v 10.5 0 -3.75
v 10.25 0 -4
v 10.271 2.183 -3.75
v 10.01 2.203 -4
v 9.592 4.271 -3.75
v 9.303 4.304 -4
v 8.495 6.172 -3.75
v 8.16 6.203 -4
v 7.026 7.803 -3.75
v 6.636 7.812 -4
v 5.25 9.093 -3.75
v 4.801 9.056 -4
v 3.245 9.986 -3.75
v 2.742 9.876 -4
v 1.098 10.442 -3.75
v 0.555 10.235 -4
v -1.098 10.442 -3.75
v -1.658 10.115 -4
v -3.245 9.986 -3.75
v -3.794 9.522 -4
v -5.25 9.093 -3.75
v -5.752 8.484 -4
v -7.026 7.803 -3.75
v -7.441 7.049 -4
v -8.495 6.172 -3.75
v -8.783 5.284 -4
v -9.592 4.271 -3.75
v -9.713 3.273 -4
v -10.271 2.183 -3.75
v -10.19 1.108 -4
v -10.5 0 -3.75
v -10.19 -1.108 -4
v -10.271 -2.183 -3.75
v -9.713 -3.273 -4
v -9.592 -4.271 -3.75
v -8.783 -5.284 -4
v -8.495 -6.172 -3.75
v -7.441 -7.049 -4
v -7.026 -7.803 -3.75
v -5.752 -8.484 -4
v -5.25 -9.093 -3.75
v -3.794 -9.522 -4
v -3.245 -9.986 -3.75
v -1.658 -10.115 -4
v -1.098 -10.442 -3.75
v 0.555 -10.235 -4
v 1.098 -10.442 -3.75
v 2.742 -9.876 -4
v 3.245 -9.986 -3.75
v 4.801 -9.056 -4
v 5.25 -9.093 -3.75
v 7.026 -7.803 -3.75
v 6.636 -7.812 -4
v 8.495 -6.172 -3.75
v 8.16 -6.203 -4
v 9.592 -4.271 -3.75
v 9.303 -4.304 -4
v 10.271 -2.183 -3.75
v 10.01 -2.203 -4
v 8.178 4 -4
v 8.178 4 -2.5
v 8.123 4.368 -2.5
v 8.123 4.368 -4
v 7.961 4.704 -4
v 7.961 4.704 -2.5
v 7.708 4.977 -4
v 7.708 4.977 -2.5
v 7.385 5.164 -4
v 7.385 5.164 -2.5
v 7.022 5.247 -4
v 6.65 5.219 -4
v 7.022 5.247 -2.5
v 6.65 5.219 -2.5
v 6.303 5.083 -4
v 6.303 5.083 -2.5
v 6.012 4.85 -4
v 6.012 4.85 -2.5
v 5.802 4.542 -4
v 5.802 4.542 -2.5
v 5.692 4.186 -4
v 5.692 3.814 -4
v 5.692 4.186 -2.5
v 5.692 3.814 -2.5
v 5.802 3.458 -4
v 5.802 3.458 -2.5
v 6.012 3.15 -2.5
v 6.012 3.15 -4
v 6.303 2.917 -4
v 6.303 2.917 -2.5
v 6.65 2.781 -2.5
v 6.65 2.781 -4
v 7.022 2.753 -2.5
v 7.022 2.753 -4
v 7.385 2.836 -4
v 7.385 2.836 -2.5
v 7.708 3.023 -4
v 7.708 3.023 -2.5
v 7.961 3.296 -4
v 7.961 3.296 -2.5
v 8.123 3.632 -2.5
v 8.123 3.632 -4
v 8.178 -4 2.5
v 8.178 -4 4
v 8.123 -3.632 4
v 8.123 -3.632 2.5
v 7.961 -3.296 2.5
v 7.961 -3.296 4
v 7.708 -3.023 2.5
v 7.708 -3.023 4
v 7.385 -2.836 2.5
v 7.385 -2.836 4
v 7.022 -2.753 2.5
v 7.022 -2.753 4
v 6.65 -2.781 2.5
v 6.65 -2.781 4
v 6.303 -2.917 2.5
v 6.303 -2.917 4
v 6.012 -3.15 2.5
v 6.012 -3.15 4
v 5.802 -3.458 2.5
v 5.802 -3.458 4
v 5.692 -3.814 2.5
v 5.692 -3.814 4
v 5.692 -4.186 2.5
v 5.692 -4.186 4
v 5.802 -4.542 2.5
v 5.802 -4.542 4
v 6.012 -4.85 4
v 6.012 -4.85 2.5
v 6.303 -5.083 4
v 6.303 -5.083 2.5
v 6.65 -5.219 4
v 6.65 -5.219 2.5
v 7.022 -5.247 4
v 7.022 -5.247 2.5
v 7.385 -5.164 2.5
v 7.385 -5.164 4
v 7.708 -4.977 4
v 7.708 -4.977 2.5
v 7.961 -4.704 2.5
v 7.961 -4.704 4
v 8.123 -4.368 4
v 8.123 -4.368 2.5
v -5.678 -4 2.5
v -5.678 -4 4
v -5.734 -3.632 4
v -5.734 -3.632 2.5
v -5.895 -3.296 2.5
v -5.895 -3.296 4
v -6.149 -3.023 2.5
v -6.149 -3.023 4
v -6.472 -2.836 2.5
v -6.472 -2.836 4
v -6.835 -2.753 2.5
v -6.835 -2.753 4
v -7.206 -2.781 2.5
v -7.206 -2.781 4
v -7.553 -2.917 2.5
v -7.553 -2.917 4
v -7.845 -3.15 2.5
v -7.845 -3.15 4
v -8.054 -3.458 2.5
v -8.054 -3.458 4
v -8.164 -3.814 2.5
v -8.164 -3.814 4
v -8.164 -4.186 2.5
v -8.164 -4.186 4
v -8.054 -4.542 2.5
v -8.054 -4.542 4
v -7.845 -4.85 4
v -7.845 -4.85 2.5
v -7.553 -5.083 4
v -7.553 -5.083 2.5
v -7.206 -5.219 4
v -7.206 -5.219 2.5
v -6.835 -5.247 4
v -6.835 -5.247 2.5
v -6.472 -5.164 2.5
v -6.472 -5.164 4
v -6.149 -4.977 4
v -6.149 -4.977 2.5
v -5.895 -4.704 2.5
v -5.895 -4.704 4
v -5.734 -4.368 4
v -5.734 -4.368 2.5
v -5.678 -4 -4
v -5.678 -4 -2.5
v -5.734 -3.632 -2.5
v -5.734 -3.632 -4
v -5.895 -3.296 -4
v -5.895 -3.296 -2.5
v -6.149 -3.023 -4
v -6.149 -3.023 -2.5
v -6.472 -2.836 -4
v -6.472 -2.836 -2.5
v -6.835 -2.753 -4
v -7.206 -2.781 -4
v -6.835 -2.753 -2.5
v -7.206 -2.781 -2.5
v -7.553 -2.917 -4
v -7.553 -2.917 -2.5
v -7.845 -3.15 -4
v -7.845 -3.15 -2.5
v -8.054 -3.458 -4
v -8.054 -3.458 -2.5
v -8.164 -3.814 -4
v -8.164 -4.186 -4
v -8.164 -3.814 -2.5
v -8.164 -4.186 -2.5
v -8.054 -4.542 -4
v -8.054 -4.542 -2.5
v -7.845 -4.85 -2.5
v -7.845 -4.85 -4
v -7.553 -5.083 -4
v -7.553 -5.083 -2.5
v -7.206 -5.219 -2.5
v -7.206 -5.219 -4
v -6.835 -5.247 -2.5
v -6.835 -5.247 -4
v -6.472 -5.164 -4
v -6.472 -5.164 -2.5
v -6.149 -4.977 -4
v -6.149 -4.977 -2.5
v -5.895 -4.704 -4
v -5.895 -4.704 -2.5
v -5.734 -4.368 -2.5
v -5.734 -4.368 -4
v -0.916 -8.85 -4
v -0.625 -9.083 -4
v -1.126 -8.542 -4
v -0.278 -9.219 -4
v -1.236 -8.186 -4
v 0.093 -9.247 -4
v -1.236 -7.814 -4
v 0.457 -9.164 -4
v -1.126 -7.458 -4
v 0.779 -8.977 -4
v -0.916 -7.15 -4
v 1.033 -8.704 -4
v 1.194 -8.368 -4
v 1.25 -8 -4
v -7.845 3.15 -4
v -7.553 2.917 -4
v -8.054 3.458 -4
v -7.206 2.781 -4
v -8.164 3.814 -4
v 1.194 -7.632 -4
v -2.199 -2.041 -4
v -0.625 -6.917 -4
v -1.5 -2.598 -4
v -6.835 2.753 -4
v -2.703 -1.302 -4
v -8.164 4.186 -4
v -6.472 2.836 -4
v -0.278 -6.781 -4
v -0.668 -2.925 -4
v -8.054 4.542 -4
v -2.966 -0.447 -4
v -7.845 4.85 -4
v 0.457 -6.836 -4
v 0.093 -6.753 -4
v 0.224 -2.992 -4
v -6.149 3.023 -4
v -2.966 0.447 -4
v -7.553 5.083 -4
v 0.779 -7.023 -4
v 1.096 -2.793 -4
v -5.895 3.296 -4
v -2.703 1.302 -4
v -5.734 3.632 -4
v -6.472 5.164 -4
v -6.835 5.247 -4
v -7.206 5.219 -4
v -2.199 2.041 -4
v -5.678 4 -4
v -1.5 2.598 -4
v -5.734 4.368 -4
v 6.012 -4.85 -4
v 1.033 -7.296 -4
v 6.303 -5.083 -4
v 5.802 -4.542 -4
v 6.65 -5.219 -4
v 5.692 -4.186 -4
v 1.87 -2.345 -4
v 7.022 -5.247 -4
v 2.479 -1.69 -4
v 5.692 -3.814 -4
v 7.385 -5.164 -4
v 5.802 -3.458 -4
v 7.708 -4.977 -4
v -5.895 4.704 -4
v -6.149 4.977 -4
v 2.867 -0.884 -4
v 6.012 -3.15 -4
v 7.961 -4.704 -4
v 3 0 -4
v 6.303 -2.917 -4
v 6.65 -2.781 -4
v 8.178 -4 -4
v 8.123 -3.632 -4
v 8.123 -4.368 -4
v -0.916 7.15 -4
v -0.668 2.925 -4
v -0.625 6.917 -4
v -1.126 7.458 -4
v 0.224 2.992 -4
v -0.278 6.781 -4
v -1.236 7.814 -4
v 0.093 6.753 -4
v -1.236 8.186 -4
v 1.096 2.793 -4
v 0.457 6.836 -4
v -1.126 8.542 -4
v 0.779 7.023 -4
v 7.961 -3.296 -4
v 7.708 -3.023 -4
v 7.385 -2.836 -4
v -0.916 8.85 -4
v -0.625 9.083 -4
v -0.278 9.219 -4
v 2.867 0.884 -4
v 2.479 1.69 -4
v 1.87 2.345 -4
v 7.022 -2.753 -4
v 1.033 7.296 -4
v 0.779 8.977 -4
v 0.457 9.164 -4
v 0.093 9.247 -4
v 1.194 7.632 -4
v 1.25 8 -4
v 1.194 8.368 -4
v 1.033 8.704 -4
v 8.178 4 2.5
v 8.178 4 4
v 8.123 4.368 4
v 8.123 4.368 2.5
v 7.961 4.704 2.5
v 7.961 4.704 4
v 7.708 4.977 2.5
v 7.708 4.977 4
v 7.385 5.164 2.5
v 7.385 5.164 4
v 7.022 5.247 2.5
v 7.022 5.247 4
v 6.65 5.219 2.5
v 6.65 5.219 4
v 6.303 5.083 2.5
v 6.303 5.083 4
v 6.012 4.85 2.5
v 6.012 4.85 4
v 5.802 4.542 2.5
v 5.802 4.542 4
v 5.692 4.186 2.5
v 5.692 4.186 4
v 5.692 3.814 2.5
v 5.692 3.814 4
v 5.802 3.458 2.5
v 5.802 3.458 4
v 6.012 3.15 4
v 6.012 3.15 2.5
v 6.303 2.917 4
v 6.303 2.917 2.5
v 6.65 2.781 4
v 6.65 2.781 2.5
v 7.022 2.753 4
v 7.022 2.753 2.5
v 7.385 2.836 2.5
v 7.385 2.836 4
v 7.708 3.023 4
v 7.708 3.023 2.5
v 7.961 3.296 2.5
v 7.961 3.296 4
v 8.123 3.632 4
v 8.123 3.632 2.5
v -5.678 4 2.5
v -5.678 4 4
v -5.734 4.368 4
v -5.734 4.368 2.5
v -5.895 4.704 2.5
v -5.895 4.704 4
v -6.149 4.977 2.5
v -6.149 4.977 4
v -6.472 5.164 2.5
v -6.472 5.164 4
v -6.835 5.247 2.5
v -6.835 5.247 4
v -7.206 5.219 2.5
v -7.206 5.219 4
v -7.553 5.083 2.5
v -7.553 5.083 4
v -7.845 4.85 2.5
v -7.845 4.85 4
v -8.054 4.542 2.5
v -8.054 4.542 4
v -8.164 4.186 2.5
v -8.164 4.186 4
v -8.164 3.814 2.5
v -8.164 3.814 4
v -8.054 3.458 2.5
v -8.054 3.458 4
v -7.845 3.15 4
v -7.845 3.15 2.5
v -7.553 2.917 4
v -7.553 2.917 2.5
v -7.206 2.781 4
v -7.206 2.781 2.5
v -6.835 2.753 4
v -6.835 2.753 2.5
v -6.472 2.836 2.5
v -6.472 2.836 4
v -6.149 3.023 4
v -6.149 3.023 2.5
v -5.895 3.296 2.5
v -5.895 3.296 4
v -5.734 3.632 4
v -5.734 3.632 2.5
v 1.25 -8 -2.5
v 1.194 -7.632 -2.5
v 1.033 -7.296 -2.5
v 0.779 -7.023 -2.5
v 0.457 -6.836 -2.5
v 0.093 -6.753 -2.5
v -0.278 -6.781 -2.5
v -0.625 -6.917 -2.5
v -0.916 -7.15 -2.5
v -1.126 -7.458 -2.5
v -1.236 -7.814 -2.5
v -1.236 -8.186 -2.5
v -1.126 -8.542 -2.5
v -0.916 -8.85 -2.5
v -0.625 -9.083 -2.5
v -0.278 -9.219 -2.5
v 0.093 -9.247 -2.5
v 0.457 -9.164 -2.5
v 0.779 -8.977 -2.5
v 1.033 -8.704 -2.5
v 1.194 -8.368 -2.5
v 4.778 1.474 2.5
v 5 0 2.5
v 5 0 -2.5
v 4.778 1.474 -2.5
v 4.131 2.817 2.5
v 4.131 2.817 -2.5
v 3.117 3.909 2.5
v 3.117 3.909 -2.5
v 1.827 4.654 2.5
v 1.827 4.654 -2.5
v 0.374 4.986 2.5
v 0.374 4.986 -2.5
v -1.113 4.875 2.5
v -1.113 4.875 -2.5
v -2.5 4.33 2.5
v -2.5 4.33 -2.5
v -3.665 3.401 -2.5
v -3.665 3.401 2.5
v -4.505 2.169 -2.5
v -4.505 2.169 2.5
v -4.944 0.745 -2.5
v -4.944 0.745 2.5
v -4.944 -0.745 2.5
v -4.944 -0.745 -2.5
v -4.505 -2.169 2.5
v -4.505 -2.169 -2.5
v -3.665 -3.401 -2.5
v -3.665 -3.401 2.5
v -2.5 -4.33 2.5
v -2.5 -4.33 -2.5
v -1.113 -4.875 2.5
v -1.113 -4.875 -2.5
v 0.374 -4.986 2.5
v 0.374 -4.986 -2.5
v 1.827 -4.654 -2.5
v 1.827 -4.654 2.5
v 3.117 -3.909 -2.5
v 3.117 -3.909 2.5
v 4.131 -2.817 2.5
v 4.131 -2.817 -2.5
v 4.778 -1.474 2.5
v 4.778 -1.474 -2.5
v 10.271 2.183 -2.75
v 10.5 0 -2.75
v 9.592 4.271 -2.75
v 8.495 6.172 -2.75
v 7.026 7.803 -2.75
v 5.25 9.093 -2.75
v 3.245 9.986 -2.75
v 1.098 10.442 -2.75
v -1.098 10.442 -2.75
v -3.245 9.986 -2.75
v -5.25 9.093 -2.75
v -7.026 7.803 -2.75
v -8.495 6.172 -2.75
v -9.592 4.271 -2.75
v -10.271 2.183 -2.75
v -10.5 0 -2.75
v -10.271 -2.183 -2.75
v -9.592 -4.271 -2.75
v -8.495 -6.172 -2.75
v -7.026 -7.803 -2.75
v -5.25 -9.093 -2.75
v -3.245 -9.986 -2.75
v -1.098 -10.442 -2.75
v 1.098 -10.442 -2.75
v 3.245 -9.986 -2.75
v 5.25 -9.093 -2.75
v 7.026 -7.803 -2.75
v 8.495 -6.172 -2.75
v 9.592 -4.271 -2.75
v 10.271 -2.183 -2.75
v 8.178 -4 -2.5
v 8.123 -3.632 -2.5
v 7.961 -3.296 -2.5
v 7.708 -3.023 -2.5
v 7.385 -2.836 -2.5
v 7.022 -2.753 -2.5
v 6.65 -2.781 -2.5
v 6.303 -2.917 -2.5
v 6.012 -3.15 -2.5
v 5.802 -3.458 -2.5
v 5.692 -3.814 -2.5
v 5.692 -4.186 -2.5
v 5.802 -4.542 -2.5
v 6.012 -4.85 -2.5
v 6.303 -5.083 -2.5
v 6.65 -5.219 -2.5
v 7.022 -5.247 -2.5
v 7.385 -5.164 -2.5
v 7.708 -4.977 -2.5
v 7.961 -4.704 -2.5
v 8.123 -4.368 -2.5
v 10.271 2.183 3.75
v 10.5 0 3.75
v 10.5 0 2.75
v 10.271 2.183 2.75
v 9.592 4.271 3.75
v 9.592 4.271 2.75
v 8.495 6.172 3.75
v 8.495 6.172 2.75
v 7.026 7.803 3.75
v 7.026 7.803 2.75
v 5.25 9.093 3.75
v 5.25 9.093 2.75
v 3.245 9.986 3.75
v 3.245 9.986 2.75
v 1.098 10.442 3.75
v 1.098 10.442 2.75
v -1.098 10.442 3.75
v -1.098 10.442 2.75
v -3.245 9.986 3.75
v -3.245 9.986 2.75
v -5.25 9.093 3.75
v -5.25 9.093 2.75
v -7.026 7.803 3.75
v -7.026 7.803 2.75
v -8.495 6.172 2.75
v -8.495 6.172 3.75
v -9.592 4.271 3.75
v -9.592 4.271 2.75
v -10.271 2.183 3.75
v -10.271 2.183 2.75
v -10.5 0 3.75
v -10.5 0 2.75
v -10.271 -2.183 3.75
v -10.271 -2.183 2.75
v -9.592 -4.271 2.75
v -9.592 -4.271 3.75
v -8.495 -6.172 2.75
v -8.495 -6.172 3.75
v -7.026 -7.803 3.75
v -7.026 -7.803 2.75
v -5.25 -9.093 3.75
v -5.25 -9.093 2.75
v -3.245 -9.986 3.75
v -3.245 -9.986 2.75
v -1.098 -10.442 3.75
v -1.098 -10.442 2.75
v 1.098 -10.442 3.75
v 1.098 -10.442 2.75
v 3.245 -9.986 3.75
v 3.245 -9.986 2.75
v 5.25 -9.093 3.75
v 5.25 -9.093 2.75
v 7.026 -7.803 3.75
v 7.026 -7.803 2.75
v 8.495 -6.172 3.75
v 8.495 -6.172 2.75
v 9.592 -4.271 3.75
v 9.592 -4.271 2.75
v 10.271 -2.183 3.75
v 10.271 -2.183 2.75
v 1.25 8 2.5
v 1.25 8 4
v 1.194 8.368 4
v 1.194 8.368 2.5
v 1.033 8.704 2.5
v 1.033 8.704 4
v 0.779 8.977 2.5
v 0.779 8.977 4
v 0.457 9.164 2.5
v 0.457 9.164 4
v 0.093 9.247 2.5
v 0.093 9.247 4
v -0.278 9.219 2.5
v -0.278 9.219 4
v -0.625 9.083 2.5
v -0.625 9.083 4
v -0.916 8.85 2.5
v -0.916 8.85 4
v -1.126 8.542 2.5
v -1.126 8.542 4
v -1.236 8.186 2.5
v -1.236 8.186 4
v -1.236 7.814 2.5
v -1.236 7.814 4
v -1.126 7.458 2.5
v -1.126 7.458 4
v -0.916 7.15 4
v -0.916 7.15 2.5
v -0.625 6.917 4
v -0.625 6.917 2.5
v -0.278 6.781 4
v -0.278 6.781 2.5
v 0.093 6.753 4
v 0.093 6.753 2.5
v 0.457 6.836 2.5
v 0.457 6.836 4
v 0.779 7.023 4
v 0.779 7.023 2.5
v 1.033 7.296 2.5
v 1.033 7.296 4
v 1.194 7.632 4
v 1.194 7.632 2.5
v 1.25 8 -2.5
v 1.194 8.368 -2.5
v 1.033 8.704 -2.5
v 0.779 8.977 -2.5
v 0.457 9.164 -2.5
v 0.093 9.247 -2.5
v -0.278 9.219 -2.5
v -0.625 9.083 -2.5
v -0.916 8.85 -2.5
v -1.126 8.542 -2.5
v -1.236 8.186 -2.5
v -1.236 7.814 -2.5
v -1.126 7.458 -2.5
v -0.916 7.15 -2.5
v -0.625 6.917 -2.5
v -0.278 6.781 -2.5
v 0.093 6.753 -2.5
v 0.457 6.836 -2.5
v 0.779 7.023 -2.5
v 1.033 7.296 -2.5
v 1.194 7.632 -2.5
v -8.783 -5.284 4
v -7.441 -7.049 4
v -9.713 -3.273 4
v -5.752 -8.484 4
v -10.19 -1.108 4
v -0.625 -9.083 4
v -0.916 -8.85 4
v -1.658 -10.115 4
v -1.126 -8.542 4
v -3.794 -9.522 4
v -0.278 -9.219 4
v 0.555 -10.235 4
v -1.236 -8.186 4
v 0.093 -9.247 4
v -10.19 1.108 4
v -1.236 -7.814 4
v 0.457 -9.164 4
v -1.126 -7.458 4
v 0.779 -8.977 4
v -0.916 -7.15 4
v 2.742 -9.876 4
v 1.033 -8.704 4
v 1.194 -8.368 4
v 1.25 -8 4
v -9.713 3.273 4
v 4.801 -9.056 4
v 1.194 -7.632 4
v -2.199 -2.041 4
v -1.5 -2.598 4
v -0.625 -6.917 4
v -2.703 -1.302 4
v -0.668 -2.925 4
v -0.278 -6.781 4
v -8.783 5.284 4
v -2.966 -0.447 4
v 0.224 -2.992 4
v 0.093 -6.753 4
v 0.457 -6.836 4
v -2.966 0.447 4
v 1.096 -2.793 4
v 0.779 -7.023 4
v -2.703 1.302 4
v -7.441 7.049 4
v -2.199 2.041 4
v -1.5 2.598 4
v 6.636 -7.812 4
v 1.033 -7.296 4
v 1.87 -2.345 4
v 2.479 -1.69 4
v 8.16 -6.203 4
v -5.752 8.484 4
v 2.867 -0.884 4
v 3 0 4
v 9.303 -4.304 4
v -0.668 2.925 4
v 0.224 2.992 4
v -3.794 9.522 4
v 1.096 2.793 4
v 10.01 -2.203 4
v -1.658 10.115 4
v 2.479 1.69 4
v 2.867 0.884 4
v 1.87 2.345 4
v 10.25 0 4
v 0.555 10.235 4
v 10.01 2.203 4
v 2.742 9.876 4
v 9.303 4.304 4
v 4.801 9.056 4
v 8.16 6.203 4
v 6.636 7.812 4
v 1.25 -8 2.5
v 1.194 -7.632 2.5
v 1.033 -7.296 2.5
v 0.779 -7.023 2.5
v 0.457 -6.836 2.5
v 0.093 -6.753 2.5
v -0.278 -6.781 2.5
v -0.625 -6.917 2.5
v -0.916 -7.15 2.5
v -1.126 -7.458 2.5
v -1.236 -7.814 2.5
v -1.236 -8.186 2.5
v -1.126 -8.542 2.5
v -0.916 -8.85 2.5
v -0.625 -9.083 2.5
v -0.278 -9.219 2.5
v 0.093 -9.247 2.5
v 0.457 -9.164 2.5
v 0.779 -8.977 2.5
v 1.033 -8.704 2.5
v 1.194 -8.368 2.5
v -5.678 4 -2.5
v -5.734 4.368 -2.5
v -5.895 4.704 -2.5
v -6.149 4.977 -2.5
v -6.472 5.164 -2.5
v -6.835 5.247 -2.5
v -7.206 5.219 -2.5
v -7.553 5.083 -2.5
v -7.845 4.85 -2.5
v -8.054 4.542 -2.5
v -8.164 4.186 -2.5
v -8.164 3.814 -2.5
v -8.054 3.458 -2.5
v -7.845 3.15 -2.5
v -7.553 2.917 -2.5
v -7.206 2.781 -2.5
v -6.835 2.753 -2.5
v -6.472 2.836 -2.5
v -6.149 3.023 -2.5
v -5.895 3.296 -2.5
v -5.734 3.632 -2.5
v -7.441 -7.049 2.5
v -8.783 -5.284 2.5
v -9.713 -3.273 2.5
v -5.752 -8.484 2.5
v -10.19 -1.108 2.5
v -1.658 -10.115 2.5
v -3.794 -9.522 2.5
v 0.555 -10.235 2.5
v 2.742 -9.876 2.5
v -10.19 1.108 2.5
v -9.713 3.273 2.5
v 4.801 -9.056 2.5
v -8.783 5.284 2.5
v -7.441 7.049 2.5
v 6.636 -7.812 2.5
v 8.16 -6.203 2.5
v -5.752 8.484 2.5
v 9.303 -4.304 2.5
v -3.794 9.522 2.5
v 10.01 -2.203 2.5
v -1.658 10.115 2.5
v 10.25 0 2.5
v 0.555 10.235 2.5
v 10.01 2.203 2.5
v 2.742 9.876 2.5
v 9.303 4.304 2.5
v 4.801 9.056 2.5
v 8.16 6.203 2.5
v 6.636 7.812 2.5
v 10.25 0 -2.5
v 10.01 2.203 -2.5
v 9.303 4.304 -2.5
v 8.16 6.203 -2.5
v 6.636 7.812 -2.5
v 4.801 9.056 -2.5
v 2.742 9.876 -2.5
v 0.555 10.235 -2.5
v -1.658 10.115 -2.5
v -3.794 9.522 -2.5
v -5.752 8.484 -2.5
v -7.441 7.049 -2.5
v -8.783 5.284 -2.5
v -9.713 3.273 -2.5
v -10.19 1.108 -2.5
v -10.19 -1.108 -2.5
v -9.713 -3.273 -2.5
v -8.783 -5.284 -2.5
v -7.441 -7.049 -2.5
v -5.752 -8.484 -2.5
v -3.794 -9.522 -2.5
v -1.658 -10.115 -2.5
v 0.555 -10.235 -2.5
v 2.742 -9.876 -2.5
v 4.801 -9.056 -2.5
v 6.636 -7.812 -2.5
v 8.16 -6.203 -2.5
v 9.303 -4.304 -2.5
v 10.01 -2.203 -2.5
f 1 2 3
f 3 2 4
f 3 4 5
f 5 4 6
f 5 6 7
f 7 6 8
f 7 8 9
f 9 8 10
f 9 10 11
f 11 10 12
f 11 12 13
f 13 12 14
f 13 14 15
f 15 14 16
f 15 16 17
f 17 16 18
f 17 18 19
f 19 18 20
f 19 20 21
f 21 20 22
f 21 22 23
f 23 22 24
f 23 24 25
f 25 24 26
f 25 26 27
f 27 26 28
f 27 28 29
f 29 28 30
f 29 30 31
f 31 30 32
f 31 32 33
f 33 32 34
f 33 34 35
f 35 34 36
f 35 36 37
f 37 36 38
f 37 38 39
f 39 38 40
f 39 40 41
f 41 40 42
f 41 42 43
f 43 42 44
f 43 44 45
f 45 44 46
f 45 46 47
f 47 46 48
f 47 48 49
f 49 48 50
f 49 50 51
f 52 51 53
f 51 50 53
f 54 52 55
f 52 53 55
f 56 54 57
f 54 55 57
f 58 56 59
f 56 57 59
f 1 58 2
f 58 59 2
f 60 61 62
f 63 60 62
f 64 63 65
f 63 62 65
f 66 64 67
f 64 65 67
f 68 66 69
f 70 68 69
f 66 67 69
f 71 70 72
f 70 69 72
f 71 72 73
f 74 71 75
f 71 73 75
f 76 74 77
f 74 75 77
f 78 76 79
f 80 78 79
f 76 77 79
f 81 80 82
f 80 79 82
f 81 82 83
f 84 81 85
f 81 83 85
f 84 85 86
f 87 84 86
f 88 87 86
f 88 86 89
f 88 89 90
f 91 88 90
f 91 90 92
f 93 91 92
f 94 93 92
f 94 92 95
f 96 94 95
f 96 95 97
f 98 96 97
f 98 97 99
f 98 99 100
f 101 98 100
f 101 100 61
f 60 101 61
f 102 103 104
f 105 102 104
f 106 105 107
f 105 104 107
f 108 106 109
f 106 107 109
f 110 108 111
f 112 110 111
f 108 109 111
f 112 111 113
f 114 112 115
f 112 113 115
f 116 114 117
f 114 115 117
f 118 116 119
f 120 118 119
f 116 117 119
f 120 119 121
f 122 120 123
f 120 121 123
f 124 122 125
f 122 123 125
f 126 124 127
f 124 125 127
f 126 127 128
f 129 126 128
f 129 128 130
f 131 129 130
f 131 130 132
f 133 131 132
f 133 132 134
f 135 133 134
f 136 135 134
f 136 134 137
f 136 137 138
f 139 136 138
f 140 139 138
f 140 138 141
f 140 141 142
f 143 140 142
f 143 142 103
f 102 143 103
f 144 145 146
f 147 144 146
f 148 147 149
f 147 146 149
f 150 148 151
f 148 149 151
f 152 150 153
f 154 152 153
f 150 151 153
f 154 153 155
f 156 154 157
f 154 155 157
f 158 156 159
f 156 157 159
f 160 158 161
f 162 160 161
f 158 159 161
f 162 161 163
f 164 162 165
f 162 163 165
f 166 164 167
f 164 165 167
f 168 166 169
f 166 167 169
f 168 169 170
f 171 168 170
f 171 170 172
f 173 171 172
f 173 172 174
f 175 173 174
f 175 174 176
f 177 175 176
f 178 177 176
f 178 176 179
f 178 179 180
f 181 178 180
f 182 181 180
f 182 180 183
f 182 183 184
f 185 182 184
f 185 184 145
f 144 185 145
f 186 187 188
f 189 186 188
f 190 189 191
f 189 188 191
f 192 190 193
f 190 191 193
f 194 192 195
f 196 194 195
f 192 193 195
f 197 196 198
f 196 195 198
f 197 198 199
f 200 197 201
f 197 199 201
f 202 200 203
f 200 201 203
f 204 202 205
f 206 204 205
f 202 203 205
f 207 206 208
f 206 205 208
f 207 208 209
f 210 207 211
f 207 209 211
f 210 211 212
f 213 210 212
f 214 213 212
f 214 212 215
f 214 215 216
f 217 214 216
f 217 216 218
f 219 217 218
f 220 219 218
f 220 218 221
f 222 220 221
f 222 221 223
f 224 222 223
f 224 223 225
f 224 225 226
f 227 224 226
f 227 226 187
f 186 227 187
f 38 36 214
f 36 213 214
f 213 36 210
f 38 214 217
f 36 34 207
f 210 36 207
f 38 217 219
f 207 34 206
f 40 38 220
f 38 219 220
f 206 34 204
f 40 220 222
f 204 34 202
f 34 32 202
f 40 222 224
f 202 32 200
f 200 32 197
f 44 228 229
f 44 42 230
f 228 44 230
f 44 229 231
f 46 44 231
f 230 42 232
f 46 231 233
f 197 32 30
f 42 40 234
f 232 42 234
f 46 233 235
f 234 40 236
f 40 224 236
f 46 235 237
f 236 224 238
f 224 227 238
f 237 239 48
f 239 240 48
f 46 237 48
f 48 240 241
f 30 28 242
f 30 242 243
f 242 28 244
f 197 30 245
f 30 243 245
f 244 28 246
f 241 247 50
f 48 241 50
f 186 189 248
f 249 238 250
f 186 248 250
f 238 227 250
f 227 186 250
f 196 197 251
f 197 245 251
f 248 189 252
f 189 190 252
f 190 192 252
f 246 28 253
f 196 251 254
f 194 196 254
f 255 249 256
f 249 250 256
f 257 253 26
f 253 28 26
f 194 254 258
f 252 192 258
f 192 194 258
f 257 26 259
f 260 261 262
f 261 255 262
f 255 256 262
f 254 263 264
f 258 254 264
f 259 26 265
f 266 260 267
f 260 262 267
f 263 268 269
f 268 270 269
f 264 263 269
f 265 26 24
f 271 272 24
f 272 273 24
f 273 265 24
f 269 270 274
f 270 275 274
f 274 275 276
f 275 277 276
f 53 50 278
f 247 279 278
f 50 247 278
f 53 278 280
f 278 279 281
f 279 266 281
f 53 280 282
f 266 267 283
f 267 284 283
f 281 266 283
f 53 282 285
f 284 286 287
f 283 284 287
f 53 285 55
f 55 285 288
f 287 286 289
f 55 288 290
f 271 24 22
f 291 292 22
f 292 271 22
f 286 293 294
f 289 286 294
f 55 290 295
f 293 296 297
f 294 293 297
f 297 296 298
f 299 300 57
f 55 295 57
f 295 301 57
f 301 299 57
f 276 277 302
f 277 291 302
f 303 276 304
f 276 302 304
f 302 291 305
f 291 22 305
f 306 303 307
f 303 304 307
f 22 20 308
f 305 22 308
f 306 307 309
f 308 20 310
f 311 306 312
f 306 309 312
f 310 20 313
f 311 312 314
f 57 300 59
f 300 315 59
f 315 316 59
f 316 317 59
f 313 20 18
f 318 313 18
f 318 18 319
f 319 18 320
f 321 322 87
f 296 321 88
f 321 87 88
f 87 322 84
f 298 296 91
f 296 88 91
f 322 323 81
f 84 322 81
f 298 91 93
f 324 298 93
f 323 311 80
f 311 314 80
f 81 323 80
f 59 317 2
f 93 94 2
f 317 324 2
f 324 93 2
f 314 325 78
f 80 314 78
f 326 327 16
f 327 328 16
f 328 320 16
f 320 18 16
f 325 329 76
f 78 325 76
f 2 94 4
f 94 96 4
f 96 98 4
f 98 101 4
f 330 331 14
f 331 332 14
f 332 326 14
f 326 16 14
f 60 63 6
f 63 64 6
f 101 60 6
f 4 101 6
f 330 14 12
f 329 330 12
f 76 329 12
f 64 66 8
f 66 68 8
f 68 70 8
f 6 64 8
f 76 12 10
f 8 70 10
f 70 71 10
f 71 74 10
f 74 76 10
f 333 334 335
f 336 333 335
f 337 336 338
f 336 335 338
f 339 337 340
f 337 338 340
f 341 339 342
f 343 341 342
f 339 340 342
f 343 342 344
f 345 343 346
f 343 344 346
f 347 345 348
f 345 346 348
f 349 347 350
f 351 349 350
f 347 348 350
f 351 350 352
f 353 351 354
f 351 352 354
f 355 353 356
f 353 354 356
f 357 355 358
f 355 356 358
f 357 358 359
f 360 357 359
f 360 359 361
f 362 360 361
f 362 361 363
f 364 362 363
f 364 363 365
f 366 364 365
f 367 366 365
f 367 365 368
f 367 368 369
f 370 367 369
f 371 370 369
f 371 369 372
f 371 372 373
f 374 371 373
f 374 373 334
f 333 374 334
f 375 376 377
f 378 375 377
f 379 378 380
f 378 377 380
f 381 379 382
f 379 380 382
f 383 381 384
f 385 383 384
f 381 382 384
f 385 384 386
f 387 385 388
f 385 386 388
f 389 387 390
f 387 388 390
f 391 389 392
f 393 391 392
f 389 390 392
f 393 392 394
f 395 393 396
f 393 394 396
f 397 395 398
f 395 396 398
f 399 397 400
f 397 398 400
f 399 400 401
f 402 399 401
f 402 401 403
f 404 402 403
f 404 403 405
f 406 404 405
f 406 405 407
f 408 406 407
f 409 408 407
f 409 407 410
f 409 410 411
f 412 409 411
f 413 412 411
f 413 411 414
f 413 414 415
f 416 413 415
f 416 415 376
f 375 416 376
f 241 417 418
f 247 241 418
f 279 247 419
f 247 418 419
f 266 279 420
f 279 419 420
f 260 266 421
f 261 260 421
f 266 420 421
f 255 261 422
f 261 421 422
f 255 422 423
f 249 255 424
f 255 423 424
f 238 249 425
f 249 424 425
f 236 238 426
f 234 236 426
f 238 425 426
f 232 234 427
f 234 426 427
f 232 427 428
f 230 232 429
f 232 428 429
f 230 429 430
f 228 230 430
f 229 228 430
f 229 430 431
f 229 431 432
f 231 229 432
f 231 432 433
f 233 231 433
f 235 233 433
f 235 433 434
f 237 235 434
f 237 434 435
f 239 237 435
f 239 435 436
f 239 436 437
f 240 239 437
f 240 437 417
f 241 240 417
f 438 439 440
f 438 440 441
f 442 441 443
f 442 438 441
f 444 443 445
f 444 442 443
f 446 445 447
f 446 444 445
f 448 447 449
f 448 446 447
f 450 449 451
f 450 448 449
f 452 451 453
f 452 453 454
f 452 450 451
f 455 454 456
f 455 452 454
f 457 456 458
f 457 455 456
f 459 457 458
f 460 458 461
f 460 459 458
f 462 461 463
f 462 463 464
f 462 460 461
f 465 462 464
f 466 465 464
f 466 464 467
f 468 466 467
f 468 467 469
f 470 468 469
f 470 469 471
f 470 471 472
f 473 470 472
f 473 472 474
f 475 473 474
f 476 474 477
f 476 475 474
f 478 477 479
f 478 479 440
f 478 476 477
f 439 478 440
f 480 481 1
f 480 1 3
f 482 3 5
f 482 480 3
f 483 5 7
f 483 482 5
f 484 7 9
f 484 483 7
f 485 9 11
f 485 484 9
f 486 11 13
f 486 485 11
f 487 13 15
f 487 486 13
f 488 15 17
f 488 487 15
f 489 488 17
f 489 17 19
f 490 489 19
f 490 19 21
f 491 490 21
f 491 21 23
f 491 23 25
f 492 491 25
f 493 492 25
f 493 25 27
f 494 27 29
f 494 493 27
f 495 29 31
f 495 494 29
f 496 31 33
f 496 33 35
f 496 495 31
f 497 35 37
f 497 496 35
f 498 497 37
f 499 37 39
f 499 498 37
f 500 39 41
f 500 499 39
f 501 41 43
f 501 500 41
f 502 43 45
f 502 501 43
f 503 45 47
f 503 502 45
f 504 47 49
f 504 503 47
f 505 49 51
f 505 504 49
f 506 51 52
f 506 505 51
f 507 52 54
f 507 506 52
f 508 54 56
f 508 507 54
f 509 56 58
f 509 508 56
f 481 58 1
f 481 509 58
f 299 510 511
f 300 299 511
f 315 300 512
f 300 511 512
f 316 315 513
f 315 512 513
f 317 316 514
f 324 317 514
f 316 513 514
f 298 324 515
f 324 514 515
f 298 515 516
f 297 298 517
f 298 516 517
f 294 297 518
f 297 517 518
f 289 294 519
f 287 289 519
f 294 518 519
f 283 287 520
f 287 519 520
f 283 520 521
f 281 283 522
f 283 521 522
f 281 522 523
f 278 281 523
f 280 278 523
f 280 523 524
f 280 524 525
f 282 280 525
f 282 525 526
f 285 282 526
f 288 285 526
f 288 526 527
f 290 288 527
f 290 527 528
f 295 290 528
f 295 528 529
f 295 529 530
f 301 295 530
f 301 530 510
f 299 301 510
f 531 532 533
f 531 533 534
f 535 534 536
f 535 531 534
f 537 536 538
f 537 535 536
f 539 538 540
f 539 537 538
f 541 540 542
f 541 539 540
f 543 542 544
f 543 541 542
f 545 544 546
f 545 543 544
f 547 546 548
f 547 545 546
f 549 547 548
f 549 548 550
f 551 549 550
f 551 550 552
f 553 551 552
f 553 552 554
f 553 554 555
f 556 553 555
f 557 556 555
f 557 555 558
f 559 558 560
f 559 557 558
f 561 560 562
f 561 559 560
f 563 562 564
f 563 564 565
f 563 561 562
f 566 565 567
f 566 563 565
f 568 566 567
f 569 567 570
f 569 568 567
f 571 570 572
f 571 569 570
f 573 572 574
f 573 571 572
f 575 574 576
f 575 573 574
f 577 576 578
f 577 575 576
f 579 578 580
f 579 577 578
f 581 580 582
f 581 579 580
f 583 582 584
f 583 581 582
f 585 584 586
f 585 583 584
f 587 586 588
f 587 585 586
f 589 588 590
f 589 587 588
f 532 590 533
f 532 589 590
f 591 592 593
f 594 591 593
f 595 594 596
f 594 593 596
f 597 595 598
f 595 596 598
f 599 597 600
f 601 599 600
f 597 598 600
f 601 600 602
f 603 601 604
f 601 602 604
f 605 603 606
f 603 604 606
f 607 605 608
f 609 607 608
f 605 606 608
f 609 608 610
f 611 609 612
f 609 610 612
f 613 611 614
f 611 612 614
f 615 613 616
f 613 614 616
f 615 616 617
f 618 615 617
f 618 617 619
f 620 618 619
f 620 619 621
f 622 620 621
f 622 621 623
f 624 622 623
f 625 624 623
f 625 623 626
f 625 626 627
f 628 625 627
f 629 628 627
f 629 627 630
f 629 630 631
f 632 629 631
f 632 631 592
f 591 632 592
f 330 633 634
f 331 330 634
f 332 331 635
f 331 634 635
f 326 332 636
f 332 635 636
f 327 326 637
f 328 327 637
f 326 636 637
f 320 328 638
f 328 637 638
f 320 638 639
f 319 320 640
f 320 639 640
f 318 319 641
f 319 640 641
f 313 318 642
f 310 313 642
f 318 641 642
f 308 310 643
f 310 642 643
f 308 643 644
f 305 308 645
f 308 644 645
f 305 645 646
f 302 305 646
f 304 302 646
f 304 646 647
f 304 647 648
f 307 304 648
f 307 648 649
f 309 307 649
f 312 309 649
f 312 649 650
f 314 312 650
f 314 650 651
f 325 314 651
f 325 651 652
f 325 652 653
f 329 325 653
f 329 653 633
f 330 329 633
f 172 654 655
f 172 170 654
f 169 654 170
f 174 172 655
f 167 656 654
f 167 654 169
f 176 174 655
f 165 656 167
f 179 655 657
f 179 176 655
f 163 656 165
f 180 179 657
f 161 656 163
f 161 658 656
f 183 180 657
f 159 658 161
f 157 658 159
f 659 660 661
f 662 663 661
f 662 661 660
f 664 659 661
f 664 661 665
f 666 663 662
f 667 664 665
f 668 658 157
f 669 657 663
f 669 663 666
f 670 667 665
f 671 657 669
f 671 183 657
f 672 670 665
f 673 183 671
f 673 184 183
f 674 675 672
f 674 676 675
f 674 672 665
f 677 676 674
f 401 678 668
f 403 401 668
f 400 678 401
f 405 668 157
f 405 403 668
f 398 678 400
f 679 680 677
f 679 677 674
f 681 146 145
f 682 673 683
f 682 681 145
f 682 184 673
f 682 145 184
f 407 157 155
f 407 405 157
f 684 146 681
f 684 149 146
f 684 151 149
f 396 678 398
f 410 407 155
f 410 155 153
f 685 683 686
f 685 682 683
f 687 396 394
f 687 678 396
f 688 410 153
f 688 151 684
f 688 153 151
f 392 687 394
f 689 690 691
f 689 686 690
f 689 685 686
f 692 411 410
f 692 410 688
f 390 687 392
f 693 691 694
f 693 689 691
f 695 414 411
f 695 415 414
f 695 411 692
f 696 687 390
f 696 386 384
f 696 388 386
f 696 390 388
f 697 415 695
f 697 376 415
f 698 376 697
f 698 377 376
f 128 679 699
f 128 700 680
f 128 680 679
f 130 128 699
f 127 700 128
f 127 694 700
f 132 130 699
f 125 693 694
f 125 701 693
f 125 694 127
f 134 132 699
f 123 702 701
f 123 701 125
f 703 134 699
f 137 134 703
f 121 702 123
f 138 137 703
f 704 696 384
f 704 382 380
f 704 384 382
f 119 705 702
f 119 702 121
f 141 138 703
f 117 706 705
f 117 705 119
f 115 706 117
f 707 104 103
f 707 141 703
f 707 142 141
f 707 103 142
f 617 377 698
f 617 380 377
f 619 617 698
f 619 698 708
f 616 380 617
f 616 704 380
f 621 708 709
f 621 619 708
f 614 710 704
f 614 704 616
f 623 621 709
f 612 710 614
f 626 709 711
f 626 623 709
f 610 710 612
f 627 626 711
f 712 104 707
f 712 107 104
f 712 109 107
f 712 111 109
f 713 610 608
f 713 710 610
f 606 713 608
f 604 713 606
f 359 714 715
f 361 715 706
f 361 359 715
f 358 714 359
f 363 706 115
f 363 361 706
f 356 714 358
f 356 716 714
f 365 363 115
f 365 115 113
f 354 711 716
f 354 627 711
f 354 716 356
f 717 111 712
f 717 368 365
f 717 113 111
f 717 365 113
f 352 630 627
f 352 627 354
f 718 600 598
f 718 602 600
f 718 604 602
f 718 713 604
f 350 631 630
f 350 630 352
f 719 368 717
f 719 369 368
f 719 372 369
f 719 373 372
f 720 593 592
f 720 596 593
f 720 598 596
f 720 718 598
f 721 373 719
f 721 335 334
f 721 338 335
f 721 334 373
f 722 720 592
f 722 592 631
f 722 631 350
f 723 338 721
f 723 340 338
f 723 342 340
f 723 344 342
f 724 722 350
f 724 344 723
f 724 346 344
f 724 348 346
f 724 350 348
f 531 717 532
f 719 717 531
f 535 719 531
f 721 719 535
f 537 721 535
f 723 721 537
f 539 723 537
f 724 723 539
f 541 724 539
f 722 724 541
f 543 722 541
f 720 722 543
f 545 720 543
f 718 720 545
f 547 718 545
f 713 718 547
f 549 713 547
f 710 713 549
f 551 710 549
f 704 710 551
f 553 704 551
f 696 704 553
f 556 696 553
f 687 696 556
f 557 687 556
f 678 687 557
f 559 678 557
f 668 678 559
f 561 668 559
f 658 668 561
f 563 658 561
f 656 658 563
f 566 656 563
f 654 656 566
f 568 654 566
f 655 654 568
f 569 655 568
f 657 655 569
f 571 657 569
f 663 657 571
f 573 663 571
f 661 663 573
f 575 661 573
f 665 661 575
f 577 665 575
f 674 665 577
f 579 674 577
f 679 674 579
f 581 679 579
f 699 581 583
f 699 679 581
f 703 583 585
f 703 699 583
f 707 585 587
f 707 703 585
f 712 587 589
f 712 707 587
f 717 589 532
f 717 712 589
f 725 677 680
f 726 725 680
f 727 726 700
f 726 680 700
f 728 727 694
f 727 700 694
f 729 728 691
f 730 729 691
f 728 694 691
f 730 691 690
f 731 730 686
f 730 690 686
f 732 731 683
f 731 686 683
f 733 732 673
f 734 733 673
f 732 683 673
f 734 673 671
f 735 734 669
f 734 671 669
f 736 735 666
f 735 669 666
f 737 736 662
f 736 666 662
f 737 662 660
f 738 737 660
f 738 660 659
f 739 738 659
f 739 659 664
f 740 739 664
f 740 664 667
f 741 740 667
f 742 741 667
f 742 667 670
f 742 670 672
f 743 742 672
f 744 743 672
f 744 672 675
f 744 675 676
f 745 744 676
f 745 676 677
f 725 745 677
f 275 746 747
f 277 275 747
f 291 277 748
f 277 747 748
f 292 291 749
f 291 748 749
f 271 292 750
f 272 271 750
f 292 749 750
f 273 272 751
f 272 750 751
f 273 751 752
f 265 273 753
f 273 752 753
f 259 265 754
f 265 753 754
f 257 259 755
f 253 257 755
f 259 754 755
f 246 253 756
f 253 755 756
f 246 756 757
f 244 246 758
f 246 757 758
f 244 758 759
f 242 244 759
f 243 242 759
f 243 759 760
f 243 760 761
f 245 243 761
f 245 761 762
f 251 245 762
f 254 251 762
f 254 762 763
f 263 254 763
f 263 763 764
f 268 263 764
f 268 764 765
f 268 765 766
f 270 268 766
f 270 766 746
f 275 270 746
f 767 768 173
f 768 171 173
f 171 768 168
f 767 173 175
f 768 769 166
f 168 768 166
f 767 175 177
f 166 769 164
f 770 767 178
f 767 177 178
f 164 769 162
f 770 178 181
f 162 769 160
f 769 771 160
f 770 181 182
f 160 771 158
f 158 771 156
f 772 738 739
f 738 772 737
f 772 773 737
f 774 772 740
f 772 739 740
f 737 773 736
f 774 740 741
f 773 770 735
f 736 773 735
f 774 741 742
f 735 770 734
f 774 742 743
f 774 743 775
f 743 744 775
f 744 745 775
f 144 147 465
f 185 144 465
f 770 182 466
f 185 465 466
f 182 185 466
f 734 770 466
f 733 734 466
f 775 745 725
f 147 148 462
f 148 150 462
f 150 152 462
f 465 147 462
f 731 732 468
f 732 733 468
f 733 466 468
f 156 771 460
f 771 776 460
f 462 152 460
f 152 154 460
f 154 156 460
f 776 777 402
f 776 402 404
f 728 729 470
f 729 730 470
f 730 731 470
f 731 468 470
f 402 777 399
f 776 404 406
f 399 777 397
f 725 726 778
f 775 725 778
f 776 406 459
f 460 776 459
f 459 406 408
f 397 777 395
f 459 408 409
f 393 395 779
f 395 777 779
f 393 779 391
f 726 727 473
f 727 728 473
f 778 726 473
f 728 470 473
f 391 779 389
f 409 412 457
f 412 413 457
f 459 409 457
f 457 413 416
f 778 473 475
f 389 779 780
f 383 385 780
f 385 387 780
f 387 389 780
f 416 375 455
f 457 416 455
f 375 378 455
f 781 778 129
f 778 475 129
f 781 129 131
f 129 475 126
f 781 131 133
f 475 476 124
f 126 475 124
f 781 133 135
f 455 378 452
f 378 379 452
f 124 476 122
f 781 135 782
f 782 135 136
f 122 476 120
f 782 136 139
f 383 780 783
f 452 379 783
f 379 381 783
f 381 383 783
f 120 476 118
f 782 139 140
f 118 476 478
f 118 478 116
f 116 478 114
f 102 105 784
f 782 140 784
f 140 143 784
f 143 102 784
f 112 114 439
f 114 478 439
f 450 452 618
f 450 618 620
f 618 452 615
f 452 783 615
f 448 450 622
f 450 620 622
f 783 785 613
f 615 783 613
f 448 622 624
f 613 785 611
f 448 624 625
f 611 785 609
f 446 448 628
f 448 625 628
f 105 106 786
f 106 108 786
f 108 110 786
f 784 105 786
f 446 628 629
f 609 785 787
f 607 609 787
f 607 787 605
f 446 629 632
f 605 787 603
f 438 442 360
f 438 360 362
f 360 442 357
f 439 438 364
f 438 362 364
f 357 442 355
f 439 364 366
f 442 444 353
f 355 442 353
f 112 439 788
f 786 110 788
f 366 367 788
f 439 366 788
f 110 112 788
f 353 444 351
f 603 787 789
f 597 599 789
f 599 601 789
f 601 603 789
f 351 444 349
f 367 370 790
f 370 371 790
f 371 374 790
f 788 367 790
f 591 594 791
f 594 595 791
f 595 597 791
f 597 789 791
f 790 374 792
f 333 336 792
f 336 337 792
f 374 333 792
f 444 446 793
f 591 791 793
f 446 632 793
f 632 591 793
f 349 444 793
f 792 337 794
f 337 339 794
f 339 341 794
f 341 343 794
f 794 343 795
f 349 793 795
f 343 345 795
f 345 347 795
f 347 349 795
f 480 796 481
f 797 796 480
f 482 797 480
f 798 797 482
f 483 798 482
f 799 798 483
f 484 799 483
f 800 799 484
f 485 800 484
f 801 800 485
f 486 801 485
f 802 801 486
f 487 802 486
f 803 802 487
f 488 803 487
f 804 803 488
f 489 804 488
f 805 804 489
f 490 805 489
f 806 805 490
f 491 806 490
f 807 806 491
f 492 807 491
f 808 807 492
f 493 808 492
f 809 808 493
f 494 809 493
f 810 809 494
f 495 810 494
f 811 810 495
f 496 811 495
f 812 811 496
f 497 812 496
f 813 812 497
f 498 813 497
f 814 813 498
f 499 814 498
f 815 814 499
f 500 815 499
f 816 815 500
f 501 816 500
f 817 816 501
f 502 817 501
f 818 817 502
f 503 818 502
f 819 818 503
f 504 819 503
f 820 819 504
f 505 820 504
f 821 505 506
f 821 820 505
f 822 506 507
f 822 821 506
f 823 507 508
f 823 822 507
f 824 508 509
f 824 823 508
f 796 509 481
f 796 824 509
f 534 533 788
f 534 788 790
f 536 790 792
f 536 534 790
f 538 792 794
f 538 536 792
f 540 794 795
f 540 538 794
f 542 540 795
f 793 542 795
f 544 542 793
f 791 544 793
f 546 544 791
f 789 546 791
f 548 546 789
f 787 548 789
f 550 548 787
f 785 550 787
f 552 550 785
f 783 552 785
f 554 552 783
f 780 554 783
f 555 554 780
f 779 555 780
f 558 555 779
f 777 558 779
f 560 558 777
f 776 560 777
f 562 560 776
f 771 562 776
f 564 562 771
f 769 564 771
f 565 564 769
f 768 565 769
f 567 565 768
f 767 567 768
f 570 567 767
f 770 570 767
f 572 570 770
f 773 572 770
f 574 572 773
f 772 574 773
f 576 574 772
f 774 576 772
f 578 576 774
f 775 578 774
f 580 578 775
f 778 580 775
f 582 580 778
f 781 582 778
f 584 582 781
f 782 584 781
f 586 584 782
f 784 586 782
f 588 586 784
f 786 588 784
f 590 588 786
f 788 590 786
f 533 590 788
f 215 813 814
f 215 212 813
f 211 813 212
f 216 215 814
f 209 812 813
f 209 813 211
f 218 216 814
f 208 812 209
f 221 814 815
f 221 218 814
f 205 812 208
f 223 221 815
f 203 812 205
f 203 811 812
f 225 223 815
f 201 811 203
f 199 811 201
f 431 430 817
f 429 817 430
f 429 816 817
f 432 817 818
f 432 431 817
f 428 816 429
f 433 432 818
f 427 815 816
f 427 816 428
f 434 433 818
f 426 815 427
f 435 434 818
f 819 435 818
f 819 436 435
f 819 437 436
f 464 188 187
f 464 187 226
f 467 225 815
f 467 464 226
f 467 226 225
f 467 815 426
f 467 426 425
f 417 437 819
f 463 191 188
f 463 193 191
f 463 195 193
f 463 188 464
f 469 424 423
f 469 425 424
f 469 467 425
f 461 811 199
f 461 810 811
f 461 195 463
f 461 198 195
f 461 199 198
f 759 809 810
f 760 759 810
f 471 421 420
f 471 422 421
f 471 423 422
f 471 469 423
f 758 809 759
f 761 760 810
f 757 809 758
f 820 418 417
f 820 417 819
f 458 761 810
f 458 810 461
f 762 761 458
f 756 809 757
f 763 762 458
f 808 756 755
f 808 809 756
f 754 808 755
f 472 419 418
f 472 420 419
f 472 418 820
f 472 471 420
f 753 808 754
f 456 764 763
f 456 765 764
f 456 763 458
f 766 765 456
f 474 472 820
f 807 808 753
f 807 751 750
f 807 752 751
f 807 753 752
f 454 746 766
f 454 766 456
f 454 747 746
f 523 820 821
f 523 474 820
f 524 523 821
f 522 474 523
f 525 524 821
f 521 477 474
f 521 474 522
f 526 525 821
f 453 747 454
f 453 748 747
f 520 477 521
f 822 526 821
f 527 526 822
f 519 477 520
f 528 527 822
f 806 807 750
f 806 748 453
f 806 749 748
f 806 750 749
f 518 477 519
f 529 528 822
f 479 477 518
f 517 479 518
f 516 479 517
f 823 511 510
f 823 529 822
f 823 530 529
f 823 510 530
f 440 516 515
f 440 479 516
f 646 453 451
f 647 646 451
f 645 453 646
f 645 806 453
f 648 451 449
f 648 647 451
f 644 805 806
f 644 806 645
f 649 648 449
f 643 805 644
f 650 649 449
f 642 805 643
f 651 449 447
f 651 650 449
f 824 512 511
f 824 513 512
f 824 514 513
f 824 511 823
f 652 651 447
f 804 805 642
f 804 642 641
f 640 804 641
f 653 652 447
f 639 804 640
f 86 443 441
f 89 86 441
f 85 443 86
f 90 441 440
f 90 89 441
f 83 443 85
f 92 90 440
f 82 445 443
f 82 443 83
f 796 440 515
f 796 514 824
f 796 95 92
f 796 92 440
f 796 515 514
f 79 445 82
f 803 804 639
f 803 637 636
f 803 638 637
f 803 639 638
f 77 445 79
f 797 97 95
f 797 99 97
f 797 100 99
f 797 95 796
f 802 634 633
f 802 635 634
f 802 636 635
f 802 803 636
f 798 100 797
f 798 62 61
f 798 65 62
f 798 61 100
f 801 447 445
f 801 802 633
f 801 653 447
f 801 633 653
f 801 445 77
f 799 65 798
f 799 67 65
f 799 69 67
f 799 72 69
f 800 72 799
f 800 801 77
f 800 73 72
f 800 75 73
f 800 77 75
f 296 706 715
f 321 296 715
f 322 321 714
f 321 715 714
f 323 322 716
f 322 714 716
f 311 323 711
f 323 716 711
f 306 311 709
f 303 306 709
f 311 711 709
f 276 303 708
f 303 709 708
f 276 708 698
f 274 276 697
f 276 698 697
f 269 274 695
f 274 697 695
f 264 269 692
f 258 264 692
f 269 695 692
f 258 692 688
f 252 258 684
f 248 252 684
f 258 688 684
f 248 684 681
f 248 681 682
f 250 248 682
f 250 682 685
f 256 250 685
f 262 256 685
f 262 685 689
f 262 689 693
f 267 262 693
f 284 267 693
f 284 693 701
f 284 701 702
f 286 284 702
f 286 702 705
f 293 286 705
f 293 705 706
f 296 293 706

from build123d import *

# Parameters (mm, degrees)
SKETCH1_R                = 10.5
BOSS_EXTRUDE1_DEPTH      = 4
BOSS_EXTRUDE1_DEPTH_BACK = 4
SKETCH2_R                = 3
CUT_EXTRUDE1_DEPTH       = 10
CHAMFER1_SIZE            = 0.25
CHAMFER2_SIZE            = 0.25
CUT_EXTRUDE2_START       = -1.5
SKETCH3_OUTSIDE_W        = 29.152
SKETCH3_OUTSIDE_H        = 29.152
SKETCH3_OUTSIDE_R        = 5
CUT_EXTRUDE2_DEPTH       = 5
CHAMFER3_SIZE            = 0.25
SKETCH4_R                = 1.25
CUT_EXTRUDE3_DEPTH       = 1
CUT_EXTRUDE3_DEPTH_BACK  = 9


with BuildPart() as part:
    # Sketch1 → Boss-Extrude1 (new body, two sides)
    with BuildSketch(Plane.XY) as boss_extrude1_sk:
        Circle(SKETCH1_R)
    extrude(amount=BOSS_EXTRUDE1_DEPTH)
    extrude(boss_extrude1_sk.sketch, amount=-BOSS_EXTRUDE1_DEPTH_BACK)

    # Sketch2 → Cut-Extrude1 (cut)
    with BuildSketch(Plane.XY.offset(4)):
        Circle(SKETCH2_R)
    extrude(amount=-CUT_EXTRUDE1_DEPTH, mode=Mode.SUBTRACT)

    # Chamfer1
    chamfer1_edges = [part.edges().sort_by_distance(p)[0] for p in [
        (-10.5, 0, 4),
    ]]
    chamfer(chamfer1_edges, length=CHAMFER1_SIZE)

    # Chamfer2
    chamfer2_edges = [part.edges().sort_by_distance(p)[0] for p in [
        (-10.5, 0, -4),
    ]]
    chamfer(chamfer2_edges, length=CHAMFER2_SIZE)

    # Sketch3 outside → Cut-Extrude2 (cut)
    with BuildSketch(Plane.XY.offset(4).offset(CUT_EXTRUDE2_START)):
        Rectangle(SKETCH3_OUTSIDE_W, SKETCH3_OUTSIDE_H)
        Circle(SKETCH3_OUTSIDE_R, mode=Mode.SUBTRACT)
    extrude(amount=-CUT_EXTRUDE2_DEPTH, mode=Mode.SUBTRACT)

    # Chamfer3
    chamfer3_edges = [part.edges().sort_by_distance(p)[0] for p in [
        (-10.5, 0, 2.5),
        (-10.5, 0, -2.5),
    ]]
    chamfer(chamfer3_edges, length=CHAMFER3_SIZE)

    # Sketch4 → Cut-Extrude3 (cut, two sides)
    with BuildSketch(Plane.XY.offset(4)) as cut_extrude3_sk:
        with Locations((0, 8)):
            Circle(SKETCH4_R)
        with Locations((6.92820323, 4)):
            Circle(SKETCH4_R)
        with Locations((6.92820323, -4)):
            Circle(SKETCH4_R)
        with Locations((0, -8)):
            Circle(SKETCH4_R)
        with Locations((-6.92820323, -4)):
            Circle(SKETCH4_R)
        with Locations((-6.92820323, 4)):
            Circle(SKETCH4_R)
    extrude(amount=CUT_EXTRUDE3_DEPTH, mode=Mode.SUBTRACT)
    extrude(cut_extrude3_sk.sketch, amount=-CUT_EXTRUDE3_DEPTH_BACK, mode=Mode.SUBTRACT)


solid = part.part
